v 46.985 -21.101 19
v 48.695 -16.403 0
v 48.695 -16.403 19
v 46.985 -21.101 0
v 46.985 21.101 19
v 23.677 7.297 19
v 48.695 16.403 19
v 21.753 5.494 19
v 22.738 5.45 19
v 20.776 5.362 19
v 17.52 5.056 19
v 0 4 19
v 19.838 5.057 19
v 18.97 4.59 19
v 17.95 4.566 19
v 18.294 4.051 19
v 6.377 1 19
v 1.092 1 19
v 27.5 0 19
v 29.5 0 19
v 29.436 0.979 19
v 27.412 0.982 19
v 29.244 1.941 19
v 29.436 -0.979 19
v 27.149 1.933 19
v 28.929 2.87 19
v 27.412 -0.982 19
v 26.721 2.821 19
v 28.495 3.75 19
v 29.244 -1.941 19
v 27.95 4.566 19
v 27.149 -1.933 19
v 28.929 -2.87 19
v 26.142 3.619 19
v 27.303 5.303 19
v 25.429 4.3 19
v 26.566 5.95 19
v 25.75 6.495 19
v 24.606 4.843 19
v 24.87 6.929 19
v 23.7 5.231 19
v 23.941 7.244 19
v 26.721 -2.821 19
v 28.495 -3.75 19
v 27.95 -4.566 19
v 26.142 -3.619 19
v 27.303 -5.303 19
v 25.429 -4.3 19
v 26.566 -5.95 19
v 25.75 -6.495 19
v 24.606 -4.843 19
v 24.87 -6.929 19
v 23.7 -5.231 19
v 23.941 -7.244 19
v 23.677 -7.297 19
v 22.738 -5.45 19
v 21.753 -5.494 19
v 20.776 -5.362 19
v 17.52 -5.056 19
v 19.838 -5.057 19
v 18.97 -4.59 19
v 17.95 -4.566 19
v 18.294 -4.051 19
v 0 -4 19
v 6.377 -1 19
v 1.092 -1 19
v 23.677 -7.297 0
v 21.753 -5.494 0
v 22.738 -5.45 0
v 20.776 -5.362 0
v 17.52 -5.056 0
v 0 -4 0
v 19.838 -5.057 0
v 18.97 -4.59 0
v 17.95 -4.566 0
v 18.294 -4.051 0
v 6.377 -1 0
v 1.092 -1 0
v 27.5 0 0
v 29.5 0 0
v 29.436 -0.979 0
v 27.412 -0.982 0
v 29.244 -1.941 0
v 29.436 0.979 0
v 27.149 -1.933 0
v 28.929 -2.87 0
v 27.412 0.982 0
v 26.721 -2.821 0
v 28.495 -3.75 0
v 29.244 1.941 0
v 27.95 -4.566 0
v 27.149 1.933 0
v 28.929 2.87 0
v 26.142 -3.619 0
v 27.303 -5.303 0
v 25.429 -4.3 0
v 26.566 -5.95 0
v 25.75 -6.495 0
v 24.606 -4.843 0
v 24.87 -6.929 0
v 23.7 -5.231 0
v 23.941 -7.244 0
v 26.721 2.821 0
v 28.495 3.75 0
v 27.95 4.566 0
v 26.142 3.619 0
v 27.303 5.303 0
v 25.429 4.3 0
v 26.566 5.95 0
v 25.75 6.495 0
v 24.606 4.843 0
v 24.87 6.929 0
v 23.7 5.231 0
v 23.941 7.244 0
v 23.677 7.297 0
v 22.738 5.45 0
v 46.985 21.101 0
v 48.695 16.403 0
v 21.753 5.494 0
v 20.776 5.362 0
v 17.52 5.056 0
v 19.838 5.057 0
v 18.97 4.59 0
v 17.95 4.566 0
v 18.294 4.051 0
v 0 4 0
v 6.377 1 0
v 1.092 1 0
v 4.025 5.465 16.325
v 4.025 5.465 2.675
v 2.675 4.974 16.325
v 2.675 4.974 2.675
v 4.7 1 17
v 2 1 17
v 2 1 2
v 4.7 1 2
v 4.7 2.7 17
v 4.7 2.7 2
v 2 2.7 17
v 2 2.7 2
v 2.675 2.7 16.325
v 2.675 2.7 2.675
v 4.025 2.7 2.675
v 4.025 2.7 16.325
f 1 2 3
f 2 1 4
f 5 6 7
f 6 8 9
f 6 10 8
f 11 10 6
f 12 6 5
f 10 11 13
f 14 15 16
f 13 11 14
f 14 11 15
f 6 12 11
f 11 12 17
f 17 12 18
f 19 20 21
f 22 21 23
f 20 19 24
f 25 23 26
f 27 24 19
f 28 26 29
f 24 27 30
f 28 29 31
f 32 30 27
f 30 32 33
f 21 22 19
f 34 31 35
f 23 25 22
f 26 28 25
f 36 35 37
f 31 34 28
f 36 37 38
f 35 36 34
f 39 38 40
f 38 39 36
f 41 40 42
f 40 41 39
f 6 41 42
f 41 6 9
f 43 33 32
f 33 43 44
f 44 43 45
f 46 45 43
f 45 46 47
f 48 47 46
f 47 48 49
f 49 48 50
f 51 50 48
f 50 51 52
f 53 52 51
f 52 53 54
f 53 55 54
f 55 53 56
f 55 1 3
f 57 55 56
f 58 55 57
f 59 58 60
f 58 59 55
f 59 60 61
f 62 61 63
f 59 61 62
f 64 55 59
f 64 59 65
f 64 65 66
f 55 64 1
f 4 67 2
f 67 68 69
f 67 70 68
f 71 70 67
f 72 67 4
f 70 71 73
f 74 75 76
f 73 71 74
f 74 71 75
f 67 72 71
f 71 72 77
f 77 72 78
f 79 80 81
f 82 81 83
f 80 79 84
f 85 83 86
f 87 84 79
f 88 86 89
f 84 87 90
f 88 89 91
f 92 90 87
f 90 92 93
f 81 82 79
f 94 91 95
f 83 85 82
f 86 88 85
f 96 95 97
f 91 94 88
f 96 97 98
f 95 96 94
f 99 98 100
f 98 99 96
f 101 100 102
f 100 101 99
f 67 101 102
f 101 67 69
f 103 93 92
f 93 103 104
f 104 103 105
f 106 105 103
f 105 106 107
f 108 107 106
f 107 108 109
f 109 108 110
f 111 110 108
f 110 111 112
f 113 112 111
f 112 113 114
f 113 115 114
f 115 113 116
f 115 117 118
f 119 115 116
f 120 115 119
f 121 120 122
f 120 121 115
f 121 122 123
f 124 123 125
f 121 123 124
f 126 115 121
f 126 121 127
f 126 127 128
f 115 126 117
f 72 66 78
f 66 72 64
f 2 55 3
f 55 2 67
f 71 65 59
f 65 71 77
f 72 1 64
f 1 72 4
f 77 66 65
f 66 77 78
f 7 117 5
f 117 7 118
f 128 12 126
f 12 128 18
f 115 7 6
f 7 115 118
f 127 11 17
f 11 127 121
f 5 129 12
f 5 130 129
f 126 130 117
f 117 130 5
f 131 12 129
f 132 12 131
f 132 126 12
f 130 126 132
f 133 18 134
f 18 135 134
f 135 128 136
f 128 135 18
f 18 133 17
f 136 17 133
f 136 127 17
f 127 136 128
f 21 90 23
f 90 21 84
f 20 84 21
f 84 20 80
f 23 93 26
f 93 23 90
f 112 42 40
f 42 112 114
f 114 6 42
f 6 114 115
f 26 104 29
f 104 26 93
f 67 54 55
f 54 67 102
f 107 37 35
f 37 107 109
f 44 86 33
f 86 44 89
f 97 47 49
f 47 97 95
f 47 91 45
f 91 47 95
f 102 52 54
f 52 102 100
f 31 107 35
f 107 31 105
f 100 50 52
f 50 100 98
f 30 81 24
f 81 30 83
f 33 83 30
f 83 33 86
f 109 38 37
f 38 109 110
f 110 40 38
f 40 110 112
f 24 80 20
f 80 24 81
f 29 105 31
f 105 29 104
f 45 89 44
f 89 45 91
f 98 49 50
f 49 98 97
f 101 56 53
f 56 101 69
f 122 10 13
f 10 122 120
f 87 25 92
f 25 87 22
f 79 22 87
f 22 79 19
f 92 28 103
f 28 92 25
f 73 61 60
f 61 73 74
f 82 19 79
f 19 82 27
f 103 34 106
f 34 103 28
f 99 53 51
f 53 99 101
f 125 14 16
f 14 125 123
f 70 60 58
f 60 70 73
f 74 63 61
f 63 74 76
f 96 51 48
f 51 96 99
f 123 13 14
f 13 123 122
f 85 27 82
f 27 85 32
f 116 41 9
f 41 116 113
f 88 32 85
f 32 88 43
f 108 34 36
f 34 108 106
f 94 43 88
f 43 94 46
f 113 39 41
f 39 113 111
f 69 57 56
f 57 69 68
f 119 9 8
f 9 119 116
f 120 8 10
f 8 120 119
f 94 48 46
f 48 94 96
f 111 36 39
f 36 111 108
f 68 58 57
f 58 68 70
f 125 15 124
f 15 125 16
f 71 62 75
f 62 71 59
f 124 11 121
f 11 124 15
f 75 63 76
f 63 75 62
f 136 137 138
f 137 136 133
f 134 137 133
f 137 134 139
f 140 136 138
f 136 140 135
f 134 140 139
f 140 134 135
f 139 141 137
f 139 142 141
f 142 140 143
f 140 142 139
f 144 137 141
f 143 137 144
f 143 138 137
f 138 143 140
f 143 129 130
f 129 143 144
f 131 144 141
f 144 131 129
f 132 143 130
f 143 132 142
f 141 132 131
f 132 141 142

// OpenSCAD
echo(version=version());

// Values are in millimeters

$fa=1;
$fs=1;
////////////////////////////

headerLength=15;
headerWidth=2.7;

headerOffset = 2;
clipWidth = headerLength + (headerOffset * 2);

////////////////////////////
module spring(h=clipWidth, d=15, inset=4) {
  difference() {
    cylinder(h=clipWidth, d=d);
    translate([0,0,-1]) cylinder(h=clipWidth+2, d=d-inset);
    translate([-(d*2)/3,0,-1]) cylinder(h=clipWidth+2, d=d);
  }
}


module handle(length=40, r=-20, width=5) {
  difference() {
    translate([0,-3,0])
      rotate([0,0,r])
        cube([length,width,clipWidth]);

    translate([0,0,-1])
      cube([length,width,clipWidth+2]);
  }
}

difference() {
  union() {
    translate([0,-1,0]) handle(length=50);
    mirror([0,1,0]) translate([0,-1,0]) handle(length=50);
    translate([22,0,0]) spring();
  }

  translate([headerOffset,0,headerOffset]) {
    cube([headerWidth,headerWidth,headerLength]);
    translate([(headerWidth/4),0,headerWidth/4])
    cube([headerWidth-(headerWidth/2),headerLength,headerLength-(headerWidth/2)]);
  }
}

//  vim: set et ai sw=2 ts=2 :
